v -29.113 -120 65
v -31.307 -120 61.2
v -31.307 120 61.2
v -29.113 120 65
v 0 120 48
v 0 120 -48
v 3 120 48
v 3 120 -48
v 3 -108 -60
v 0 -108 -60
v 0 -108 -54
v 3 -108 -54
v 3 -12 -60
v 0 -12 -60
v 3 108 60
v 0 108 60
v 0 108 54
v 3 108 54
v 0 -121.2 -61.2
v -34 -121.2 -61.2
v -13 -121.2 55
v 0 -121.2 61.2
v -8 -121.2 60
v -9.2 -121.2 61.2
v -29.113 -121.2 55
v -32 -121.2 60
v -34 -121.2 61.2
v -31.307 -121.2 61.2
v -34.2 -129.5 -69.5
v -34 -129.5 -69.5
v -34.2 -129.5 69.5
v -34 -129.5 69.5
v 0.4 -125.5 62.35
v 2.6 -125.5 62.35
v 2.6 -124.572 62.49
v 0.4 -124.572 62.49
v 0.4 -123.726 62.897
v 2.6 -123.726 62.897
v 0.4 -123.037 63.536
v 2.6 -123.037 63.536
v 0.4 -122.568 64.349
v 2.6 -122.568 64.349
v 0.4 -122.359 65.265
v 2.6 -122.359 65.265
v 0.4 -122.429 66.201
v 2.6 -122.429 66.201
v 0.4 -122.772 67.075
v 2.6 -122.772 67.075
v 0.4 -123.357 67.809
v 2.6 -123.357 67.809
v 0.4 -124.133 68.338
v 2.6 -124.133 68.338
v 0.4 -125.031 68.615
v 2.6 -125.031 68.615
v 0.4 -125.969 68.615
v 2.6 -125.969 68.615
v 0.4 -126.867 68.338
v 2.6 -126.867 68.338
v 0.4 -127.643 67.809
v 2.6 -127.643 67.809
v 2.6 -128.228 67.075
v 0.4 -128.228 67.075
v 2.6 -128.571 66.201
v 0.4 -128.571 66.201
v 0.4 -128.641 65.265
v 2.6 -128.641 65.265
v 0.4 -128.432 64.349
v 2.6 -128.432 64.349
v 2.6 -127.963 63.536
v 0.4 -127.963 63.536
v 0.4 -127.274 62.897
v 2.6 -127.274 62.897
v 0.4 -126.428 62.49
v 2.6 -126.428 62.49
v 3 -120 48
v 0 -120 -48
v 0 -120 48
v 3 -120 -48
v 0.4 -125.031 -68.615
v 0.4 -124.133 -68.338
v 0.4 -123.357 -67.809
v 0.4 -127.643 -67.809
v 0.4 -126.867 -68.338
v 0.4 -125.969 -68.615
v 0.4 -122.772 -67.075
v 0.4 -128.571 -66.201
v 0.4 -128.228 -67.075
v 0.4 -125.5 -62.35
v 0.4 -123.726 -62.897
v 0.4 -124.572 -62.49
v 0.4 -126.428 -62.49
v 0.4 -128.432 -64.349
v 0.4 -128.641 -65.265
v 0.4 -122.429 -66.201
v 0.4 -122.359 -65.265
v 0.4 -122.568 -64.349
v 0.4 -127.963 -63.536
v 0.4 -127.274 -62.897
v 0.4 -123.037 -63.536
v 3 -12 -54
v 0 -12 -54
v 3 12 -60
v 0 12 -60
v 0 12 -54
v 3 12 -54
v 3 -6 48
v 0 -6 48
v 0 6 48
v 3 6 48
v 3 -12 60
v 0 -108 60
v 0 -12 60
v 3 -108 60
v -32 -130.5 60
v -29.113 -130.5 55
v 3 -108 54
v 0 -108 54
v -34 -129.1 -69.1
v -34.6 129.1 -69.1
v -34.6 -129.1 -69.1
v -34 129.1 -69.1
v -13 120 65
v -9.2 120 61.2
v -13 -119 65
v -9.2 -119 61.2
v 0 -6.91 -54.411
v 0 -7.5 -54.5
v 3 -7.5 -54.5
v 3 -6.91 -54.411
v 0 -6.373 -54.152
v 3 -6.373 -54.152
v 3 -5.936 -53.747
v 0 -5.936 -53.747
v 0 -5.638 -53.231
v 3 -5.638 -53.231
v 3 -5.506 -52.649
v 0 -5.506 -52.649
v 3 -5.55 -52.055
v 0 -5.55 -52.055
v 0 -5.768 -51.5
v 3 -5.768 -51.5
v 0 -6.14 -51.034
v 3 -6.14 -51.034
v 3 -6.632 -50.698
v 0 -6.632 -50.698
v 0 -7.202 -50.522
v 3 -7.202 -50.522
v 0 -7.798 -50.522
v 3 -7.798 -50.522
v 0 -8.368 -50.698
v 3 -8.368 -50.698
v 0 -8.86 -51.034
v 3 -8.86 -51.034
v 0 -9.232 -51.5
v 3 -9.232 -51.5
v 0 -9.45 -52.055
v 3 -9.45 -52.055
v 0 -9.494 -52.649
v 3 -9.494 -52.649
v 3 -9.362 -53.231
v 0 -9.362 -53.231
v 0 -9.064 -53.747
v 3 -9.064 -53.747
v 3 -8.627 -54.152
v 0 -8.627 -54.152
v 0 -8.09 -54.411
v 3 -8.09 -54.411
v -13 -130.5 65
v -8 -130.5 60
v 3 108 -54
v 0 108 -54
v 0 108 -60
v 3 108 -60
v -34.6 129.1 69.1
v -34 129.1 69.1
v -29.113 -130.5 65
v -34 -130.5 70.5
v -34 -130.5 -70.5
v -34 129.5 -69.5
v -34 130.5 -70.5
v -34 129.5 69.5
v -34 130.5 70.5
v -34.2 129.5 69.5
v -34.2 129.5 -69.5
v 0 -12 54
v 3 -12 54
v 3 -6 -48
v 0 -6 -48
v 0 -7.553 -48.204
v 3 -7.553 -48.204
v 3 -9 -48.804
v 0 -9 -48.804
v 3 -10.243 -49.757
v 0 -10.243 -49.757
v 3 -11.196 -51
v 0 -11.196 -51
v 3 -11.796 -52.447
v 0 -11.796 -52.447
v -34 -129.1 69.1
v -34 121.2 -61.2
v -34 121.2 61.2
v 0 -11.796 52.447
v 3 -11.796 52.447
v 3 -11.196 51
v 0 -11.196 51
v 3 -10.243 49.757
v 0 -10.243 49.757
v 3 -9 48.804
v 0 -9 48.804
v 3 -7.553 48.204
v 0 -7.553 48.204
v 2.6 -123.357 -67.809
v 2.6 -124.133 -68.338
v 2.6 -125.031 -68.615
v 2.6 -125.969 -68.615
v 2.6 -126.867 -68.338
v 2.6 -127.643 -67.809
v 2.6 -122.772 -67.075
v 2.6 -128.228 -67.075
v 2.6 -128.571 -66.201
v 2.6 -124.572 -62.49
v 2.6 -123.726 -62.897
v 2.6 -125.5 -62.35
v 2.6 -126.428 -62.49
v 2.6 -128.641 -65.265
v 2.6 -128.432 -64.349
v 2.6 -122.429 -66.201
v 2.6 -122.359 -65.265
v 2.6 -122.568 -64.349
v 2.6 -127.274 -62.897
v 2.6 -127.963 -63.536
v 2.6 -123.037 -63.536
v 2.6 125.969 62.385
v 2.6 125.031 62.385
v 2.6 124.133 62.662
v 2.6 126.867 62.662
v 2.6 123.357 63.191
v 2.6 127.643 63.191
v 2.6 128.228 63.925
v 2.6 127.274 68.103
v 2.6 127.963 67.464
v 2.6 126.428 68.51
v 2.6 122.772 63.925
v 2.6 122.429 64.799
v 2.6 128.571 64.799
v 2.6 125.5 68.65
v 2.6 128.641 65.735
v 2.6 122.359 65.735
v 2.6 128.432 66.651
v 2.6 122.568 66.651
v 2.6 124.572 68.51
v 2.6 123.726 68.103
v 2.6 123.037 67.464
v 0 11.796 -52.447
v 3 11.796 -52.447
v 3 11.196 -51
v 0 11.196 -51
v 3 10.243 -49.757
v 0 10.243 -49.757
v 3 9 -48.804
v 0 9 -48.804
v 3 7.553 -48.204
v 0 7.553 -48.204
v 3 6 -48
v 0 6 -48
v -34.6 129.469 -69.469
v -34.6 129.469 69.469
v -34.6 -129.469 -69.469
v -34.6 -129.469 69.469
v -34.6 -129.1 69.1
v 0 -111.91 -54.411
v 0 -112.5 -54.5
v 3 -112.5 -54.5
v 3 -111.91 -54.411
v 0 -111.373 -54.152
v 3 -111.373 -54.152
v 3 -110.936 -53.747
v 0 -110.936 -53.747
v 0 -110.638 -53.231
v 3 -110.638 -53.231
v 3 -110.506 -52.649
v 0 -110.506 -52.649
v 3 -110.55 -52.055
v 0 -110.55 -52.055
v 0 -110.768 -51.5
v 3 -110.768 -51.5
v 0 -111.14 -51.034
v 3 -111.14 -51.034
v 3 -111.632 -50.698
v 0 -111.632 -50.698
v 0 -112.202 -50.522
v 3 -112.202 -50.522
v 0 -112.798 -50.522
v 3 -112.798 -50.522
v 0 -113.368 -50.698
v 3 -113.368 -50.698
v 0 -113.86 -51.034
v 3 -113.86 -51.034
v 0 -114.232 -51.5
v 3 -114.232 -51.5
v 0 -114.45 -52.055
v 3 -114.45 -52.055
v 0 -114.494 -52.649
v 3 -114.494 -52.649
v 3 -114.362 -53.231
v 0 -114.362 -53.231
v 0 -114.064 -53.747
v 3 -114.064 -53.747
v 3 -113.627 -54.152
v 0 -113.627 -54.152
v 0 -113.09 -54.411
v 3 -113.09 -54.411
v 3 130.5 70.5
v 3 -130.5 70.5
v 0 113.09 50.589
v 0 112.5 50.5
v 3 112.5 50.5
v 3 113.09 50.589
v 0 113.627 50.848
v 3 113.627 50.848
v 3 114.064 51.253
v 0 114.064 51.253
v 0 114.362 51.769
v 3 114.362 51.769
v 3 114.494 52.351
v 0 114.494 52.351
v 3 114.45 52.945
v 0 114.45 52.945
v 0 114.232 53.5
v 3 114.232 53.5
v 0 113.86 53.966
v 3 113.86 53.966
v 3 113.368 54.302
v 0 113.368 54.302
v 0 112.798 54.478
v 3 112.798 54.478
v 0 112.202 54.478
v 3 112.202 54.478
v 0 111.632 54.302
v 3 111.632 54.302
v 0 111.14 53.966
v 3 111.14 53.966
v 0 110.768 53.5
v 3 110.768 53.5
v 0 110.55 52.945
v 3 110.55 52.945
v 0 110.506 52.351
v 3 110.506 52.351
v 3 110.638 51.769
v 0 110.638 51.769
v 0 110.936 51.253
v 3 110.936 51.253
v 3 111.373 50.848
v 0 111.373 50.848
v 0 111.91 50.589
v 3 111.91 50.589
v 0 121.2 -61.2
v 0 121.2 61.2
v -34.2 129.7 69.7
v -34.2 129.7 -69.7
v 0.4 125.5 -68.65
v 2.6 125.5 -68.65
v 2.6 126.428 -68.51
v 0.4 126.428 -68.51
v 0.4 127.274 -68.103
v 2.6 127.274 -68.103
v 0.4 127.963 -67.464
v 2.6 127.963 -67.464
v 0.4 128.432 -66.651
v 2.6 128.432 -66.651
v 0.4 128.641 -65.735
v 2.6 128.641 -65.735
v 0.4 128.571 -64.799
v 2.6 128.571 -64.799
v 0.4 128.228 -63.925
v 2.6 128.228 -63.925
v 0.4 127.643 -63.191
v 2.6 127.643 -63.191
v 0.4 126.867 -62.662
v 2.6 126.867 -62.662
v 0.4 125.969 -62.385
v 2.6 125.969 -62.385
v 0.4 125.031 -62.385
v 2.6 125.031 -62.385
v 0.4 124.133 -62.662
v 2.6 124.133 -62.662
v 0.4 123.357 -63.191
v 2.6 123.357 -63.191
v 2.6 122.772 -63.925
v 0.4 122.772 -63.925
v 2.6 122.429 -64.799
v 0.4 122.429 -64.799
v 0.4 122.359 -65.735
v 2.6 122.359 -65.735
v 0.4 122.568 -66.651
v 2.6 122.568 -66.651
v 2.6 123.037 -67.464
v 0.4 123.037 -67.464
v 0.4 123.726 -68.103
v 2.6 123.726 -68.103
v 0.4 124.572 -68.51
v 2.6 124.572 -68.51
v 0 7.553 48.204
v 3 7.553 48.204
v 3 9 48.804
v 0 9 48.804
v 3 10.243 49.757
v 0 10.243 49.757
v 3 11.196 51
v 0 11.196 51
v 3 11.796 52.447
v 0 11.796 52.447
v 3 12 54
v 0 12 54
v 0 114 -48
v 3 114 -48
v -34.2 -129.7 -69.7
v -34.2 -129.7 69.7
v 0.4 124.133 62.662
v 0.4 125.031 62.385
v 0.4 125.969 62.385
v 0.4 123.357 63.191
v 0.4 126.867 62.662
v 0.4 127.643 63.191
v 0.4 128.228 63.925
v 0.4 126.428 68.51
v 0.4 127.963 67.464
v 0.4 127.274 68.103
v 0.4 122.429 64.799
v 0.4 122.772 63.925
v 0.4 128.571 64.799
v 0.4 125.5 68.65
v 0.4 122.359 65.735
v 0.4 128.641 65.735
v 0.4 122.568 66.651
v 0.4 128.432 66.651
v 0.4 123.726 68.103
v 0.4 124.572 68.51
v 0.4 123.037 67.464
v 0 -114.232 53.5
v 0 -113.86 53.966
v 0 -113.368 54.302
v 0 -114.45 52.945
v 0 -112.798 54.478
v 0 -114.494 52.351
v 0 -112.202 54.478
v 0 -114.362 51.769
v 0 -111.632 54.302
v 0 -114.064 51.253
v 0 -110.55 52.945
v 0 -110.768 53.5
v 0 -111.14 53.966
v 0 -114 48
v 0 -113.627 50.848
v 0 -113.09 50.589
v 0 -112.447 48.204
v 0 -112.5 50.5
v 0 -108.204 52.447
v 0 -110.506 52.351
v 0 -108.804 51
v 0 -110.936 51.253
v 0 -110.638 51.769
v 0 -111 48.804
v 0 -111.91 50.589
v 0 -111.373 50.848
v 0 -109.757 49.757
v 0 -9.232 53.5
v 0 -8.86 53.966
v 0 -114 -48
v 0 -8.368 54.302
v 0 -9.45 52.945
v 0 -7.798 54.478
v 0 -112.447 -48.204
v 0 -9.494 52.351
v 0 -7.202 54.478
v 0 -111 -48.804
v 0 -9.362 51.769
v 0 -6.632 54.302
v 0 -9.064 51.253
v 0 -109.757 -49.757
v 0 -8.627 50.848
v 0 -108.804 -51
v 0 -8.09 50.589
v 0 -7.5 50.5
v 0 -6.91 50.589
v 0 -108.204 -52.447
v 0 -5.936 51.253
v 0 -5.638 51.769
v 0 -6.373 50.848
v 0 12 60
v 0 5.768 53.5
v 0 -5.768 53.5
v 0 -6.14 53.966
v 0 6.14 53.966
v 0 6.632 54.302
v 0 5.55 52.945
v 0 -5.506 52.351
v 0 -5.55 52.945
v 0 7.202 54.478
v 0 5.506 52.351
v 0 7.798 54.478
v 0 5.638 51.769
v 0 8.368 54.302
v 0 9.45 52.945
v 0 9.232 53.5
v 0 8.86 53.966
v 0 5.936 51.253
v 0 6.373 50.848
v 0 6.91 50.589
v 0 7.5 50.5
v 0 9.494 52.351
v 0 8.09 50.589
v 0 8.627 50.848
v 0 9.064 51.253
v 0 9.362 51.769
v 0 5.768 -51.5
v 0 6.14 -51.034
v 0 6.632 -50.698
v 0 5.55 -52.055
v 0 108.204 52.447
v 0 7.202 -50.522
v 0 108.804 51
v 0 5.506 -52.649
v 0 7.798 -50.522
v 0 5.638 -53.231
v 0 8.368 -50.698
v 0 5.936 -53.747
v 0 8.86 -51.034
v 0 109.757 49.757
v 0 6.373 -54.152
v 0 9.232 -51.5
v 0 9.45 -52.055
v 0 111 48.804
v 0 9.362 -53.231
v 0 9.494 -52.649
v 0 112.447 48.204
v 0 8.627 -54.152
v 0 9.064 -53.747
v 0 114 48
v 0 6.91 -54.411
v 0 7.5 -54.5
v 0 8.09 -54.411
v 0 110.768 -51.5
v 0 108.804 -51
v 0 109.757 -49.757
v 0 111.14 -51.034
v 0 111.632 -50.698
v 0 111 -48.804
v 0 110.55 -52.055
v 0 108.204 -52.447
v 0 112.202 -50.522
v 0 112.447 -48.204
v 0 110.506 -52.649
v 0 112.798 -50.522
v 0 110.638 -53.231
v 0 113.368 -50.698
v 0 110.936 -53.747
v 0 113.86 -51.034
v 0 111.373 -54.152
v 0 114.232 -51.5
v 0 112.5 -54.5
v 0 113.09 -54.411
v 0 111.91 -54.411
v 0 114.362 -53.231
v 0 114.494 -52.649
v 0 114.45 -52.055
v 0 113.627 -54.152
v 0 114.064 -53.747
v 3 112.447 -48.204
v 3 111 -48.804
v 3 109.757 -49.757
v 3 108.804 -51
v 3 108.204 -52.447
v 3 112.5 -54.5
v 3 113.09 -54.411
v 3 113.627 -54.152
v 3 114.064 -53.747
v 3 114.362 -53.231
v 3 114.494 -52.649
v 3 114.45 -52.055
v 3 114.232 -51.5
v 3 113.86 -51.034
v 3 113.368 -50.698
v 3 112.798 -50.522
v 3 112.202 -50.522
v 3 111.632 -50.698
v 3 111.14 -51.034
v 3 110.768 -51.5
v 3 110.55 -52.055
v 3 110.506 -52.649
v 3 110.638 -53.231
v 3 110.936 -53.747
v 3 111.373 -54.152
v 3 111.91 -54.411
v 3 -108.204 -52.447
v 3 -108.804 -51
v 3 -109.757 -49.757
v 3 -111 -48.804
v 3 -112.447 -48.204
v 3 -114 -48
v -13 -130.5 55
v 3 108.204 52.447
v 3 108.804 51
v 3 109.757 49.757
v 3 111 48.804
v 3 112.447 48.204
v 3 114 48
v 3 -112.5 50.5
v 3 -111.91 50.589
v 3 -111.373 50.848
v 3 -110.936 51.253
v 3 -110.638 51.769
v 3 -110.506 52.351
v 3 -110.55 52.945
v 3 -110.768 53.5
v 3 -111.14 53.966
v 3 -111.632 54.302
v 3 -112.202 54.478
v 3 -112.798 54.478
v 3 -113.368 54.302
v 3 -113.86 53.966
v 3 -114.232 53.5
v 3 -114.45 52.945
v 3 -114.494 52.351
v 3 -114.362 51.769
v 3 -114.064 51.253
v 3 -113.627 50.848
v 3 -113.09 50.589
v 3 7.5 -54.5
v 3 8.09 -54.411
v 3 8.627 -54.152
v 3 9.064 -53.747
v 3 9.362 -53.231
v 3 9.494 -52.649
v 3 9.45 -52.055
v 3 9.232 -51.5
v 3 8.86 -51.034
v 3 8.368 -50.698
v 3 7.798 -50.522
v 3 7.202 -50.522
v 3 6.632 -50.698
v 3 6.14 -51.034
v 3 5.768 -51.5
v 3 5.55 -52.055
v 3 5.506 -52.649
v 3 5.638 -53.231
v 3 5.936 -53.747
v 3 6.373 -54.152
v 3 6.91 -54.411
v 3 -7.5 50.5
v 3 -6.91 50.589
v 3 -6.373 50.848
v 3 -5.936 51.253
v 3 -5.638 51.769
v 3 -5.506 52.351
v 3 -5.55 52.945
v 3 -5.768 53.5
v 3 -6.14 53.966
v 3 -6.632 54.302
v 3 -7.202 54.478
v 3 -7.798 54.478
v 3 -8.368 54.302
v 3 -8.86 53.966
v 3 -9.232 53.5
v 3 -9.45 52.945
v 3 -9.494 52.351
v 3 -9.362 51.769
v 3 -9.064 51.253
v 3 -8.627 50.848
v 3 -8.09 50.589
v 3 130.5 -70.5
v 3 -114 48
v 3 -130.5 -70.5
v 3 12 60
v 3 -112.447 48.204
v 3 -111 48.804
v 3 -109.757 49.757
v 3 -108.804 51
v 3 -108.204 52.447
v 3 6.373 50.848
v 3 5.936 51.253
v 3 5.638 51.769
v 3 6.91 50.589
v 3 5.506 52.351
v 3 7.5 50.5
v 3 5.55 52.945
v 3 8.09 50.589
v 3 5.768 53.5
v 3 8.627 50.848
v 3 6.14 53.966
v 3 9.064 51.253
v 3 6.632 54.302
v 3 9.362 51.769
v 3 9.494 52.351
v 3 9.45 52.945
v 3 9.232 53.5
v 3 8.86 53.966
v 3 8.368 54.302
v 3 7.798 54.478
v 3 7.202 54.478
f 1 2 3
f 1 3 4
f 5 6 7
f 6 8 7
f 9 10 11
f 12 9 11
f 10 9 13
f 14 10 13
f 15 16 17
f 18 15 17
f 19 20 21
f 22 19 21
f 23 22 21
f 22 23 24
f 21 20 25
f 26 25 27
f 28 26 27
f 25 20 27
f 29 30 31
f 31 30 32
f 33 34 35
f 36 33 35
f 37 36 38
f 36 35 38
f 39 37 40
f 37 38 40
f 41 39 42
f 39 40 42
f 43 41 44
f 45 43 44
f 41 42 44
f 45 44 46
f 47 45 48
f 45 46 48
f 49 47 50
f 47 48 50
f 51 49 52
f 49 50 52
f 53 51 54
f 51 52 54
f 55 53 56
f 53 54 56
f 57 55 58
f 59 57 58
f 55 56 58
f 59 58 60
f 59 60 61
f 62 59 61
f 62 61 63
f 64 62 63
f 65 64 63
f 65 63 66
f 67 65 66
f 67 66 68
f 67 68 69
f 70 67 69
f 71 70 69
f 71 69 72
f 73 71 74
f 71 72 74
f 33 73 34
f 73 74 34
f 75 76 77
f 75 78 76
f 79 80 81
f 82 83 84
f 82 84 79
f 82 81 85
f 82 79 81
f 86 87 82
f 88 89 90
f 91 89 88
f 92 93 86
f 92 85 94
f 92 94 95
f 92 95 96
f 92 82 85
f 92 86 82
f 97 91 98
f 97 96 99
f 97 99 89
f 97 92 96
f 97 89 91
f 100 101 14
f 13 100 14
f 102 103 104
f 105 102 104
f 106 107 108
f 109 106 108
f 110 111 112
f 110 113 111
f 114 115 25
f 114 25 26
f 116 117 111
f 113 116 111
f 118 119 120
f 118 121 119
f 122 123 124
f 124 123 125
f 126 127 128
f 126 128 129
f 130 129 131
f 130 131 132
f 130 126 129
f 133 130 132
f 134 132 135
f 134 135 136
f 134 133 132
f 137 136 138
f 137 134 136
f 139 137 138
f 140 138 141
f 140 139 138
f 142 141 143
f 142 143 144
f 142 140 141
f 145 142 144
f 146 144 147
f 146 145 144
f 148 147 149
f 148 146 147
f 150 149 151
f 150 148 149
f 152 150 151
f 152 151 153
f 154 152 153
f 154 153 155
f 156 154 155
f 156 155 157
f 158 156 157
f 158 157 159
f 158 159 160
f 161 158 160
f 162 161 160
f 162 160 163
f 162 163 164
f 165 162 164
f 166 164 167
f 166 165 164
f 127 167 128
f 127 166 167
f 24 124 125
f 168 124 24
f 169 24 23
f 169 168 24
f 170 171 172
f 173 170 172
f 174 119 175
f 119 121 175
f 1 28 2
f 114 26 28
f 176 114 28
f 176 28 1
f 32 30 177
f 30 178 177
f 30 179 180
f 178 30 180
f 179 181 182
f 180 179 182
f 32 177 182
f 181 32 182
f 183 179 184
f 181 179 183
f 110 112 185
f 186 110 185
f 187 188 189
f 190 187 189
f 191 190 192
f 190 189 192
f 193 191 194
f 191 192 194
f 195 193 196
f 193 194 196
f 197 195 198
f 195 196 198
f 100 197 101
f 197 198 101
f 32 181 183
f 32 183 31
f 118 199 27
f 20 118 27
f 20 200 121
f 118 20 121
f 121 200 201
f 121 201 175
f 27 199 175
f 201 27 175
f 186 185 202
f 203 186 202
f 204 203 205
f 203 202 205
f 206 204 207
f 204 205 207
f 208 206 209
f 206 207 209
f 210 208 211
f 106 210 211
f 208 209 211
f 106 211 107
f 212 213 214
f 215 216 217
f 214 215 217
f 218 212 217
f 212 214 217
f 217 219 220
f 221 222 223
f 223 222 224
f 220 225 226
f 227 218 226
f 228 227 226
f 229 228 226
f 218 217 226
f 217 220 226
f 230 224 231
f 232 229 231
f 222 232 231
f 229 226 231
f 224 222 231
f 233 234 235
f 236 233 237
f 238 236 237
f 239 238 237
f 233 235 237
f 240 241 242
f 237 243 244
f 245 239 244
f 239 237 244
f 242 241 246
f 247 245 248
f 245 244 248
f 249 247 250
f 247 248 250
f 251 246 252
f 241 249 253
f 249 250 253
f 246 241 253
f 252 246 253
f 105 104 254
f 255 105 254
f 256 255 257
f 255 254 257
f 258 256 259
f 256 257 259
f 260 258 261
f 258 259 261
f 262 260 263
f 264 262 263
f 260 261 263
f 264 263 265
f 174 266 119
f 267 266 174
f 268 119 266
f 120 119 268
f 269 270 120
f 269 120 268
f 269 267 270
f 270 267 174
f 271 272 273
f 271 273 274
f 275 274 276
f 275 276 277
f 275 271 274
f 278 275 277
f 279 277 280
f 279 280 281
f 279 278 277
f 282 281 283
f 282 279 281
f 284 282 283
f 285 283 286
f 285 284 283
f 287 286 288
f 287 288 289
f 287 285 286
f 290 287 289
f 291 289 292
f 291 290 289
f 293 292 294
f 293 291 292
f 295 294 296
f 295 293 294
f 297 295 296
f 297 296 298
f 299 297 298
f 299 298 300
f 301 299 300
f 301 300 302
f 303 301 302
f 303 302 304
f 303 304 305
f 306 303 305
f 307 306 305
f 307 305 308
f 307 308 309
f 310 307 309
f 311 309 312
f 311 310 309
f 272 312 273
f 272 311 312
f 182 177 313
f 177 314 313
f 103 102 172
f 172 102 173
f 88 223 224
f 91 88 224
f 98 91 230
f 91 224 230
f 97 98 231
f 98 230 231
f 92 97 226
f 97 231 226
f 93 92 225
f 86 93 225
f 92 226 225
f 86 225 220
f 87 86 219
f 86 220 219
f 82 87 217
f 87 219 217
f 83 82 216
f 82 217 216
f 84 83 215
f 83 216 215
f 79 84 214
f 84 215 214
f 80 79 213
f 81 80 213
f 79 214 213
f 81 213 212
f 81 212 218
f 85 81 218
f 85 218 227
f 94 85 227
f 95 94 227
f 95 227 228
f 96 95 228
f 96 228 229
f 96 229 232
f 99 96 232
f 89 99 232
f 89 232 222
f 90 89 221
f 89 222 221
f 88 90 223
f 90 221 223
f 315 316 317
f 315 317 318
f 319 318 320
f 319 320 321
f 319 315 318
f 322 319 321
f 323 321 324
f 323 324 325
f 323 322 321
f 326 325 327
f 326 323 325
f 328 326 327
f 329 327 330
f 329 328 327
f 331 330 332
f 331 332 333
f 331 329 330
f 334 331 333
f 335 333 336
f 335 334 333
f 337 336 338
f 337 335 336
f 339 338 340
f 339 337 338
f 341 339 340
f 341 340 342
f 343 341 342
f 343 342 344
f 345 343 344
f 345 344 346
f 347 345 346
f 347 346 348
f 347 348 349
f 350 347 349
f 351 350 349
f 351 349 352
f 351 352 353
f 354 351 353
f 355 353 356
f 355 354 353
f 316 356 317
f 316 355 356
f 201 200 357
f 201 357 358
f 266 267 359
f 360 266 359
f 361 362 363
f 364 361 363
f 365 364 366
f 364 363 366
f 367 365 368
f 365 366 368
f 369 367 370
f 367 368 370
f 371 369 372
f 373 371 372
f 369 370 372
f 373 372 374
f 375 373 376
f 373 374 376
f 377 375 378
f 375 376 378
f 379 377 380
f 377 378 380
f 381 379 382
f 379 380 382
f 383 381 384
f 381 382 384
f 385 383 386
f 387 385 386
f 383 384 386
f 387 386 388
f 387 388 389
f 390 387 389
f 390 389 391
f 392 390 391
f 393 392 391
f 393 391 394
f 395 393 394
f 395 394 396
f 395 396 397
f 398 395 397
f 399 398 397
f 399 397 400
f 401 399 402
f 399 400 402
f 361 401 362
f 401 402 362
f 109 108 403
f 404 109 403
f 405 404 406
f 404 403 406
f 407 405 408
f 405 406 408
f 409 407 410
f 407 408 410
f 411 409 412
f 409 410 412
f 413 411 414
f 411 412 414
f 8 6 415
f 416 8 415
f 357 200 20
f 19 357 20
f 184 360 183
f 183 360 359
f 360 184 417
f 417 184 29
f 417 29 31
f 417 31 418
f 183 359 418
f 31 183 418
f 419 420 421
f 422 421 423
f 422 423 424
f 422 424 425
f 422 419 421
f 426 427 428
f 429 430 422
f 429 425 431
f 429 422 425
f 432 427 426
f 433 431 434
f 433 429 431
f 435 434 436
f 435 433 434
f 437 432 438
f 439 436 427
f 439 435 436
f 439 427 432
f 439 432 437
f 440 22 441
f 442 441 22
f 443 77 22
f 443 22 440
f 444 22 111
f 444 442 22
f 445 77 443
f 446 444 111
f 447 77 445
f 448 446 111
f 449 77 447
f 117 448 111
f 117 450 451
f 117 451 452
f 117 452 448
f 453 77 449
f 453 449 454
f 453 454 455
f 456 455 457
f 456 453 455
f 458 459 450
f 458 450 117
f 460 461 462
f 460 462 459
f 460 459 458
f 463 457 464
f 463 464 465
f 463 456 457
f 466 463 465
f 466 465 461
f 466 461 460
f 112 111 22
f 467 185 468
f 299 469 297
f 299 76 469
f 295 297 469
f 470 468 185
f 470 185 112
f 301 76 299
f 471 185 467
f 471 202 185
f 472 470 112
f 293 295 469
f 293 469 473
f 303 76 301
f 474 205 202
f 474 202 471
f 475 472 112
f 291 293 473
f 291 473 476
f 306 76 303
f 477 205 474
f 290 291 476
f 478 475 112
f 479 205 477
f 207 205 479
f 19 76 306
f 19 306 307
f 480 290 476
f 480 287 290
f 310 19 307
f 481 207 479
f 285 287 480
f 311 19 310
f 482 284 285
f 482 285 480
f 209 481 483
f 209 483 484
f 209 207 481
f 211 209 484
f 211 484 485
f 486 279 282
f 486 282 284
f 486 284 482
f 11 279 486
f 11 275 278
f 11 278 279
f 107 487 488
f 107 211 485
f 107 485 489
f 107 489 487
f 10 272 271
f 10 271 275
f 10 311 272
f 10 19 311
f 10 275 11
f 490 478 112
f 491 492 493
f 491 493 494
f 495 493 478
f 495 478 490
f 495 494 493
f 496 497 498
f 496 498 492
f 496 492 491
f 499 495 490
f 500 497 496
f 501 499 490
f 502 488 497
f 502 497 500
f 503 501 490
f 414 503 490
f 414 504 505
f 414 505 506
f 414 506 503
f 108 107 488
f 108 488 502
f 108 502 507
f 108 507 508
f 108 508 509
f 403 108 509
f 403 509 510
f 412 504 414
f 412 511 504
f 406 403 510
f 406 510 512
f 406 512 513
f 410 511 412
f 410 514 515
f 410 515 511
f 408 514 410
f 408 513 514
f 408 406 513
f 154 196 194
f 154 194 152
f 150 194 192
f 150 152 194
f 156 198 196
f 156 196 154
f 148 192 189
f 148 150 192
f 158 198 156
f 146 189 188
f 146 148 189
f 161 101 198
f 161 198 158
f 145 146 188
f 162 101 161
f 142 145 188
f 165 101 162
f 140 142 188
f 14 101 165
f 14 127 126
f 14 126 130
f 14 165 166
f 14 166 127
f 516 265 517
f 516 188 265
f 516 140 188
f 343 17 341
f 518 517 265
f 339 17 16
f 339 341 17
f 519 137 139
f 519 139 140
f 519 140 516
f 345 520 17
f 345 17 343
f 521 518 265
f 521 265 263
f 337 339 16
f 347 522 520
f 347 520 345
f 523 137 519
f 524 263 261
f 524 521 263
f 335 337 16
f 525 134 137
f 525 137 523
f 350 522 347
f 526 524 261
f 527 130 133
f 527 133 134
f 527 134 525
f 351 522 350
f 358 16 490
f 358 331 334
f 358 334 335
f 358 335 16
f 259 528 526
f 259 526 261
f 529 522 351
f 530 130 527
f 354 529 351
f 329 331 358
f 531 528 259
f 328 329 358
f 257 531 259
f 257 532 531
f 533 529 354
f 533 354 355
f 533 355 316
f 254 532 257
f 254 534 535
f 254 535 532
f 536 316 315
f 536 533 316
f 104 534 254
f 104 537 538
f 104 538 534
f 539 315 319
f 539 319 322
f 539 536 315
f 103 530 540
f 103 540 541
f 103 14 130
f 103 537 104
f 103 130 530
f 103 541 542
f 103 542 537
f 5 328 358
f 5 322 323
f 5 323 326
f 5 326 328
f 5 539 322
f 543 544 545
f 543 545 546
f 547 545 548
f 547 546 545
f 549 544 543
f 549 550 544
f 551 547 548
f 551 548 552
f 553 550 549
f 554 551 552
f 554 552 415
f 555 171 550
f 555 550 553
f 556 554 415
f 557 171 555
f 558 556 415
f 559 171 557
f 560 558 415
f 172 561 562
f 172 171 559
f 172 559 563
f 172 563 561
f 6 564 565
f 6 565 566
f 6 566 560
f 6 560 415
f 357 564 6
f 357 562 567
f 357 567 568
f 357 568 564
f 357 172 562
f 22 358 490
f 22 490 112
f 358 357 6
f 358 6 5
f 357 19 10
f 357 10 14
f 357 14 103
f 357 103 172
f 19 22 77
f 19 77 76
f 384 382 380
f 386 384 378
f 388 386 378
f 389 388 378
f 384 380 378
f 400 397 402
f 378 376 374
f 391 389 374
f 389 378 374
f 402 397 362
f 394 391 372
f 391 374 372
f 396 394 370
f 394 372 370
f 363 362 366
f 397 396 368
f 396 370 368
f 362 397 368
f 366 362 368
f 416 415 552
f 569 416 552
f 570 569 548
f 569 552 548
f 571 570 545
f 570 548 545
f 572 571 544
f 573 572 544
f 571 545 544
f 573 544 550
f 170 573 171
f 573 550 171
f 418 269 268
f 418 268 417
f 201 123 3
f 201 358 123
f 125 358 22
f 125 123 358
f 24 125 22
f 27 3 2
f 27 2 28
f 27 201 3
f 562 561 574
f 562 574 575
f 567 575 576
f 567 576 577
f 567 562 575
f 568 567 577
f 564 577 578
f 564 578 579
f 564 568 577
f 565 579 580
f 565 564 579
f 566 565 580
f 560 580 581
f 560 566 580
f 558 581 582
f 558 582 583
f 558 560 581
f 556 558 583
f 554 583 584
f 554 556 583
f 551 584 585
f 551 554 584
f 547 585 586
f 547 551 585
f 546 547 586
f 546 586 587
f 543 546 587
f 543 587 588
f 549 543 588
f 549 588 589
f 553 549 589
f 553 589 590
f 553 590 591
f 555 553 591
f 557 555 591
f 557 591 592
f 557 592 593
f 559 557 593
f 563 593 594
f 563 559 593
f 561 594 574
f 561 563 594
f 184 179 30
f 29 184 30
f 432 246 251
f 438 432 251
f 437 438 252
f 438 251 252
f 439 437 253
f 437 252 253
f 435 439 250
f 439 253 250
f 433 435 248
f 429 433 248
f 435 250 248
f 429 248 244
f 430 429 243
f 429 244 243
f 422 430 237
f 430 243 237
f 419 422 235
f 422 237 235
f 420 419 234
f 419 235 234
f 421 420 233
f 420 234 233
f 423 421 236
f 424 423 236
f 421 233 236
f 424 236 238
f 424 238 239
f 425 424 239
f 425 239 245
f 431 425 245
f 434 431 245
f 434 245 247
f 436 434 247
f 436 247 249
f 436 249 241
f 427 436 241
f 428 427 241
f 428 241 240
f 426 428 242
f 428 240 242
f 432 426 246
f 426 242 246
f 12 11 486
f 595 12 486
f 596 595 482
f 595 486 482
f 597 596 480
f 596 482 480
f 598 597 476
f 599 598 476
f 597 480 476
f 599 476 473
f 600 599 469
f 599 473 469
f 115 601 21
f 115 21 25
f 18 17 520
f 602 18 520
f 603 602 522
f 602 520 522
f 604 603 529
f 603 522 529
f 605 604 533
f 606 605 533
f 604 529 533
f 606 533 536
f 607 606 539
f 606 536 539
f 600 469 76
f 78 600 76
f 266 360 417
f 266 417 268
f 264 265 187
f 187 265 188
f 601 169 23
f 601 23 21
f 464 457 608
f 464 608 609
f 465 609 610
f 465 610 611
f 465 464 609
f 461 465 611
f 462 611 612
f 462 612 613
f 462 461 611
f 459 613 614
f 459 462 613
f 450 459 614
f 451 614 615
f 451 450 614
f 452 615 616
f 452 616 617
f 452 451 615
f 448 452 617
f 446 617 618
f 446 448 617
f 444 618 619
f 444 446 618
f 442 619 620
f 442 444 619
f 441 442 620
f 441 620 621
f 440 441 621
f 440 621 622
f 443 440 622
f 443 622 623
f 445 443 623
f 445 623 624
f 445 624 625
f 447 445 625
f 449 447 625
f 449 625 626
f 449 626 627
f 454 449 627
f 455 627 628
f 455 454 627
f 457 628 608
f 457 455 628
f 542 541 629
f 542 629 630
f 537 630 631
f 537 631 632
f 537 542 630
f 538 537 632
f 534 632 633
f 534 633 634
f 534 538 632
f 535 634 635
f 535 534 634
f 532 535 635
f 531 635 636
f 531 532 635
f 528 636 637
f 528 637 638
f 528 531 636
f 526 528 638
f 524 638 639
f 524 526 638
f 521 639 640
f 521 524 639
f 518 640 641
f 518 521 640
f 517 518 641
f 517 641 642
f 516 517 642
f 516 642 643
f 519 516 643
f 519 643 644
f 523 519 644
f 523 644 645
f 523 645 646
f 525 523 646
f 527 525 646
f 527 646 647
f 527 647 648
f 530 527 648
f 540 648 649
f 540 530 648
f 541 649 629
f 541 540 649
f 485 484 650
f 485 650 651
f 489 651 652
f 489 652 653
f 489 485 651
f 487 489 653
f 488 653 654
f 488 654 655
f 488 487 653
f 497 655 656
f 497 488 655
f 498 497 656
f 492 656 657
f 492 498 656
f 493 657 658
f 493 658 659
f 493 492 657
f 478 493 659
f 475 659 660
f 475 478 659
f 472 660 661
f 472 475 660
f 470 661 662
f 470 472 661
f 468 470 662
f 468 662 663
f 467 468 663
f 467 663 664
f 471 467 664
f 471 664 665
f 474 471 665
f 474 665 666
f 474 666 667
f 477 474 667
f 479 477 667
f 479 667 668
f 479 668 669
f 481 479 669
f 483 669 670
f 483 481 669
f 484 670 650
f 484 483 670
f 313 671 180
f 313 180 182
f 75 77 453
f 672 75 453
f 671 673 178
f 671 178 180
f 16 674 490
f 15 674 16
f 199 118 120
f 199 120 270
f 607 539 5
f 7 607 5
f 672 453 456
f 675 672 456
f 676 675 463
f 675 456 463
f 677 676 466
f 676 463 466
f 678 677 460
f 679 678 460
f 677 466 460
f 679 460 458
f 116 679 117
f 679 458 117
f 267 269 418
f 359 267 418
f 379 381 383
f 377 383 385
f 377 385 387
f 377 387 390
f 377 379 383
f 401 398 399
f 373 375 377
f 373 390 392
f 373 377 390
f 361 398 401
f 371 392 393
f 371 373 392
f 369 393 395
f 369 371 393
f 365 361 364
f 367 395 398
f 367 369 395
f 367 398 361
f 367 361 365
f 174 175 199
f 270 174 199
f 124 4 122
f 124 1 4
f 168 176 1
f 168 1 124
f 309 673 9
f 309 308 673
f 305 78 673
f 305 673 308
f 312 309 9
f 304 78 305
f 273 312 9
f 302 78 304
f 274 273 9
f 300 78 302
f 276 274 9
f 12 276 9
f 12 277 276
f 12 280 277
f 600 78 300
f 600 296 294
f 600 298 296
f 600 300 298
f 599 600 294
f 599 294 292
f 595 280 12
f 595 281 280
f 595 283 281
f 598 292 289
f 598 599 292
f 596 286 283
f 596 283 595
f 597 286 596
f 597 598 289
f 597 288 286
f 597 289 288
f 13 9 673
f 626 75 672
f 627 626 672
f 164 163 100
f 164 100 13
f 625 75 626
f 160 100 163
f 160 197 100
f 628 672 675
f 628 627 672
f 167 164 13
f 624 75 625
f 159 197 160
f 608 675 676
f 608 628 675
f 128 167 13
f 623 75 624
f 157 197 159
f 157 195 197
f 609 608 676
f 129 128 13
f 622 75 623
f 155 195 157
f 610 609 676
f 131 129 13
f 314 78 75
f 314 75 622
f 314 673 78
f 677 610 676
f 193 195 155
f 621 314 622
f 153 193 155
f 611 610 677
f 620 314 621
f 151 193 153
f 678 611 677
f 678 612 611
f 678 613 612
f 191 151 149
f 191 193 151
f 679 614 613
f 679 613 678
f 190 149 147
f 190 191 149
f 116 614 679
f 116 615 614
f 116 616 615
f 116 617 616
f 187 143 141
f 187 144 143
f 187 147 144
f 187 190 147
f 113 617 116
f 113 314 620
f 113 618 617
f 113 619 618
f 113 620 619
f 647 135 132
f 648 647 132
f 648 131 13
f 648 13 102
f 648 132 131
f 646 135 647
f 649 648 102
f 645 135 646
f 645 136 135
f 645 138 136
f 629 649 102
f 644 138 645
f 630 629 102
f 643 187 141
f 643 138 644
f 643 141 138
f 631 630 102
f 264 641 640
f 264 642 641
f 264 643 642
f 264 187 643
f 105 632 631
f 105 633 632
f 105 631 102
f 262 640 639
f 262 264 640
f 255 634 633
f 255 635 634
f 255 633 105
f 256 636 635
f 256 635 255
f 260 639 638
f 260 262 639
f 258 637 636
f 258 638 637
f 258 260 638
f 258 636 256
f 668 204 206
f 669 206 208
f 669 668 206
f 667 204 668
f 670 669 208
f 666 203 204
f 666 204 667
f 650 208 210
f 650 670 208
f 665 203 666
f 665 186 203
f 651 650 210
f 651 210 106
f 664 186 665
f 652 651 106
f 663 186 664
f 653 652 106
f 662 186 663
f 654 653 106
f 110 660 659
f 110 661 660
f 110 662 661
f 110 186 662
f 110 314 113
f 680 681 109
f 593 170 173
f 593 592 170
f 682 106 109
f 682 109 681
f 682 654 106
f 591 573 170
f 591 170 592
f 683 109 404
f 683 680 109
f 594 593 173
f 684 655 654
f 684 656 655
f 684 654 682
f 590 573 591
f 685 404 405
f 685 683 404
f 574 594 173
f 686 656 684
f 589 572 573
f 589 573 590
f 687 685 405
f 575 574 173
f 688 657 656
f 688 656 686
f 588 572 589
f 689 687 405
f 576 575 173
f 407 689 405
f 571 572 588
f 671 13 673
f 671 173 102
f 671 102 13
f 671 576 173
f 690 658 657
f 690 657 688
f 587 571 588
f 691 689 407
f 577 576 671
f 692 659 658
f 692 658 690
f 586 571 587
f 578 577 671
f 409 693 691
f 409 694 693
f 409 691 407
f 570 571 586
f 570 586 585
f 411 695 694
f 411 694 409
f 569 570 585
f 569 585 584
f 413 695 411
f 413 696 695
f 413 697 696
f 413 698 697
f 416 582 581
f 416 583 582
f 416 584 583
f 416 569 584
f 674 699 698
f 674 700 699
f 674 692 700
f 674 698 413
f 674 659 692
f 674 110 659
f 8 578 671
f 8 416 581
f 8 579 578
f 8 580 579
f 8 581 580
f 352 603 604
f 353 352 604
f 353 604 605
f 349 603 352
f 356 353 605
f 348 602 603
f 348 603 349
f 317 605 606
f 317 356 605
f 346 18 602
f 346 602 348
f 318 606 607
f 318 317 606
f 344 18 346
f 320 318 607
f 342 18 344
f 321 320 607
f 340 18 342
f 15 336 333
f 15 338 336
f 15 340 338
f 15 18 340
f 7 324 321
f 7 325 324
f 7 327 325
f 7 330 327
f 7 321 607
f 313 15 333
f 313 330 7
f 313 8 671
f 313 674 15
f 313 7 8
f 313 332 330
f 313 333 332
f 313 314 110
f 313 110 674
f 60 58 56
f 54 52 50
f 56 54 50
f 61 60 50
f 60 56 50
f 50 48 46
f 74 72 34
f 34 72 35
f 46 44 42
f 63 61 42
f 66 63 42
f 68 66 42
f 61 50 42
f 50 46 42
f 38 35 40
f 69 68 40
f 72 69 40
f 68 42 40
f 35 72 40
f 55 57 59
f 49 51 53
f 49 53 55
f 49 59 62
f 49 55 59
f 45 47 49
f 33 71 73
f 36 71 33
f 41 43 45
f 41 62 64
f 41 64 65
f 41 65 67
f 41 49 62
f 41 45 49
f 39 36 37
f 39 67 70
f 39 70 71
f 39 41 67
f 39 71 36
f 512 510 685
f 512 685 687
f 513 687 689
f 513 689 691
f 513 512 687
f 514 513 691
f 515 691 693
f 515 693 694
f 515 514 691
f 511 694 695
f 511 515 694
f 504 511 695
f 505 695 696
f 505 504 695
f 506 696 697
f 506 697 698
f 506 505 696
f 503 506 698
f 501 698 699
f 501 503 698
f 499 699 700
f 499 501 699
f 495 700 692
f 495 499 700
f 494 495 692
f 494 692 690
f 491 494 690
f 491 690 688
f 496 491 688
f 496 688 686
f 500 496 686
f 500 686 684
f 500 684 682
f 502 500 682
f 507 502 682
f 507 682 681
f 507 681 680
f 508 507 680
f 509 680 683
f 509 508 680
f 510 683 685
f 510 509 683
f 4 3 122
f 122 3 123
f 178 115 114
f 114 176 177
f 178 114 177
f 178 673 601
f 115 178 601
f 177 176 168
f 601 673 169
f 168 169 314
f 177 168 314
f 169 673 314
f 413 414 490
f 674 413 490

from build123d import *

# Parameters (mm, degrees)
SKETCH1_W                = 261
SKETCH1_H                = 141
SKETCH1_W_2              = 240
SKETCH1_H_2              = 120
SKETCH1_R                = 2
BOSS_EXTRUDE2_DEPTH      = 3
SKETCH1_6_W              = 261
SKETCH1_6_H              = 141
SKETCH1_6_W_2            = 240
SKETCH1_6_H_2            = 120
BOSS_EXTRUDE5_DEPTH      = 34
SKETCH14_W               = 259
SKETCH14_H               = 139
SKETCH14_W_2             = 258.2
SKETCH14_H_2             = 138.2
BOSS_EXTRUDE7_DEPTH      = 0.2
SKETCH17_W               = 259.4
SKETCH17_H               = 139.4
SKETCH17_W_2             = 258.2
SKETCH17_H_2             = 138.2
BOSS_EXTRUDE10_DEPTH     = 0.4
CHAMFER1_SIZE            = 0.4
CHAMFER1_SIZE_2          = 0.230940108
COVER_START              = -0.4
SKETCH18_R               = 3.15
COVER_MAGNET_HOLES_DEPTH = 2.2
SKETCH19_W               = 16
SKETCH19_H               = 240
CUT_EXTRUDE1_DEPTH       = 5
CHAMFER2_SIZE            = 3
CHAMFER2_SIZE_2          = 5.196152423
CHAMFER3_SIZE            = 5
CUT_EXTRUDE2_START       = -10.5
CUT_EXTRUDE2_DEPTH       = 11.5
CUT_EXTRUDE3_REACH       = 154.871
SKETCH21_W               = 242.4
SKETCH21_H               = 122.4


with BuildPart() as part:
    # Sketch1 → Boss-Extrude2 (new body)
    # profile 1 of 9: a face of its own
    with BuildSketch(Plane.YZ):
        Rectangle(SKETCH1_W, SKETCH1_H)
        Rectangle(SKETCH1_W_2, SKETCH1_H_2, mode=Mode.SUBTRACT)
    # profile 2 of 9: a face of its own
    with BuildSketch(Plane.YZ):
        with BuildLine():
            Line((-120, 60), (-120, 48))
            Line((-120, 48), (-114, 48))
            ThreePointArc((-114, 48), (-109.757359313, 49.757359313), (-108, 54))
            Line((-108, 54), (-108, 60))
            Line((-108, 60), (-120, 60))
        make_face()
        with Locations(Location((-112.5, 52.5, 0), (0, 0, 270))):
            Circle(SKETCH1_R, mode=Mode.SUBTRACT)
    # profile 3 of 9: a face of its own
    with BuildSketch(Plane.YZ):
        with BuildLine():
            Line((0, 60), (-12, 60))
            Line((-12, 60), (-12, 54))
            ThreePointArc((-12, 54), (-10.242640687, 49.757359313), (-6, 48))
            Line((-6, 48), (0, 48))
            Line((0, 48), (0, 60))
        make_face()
        with Locations(Location((-7.5, 52.5, 0), (0, 0, 270))):
            Circle(SKETCH1_R, mode=Mode.SUBTRACT)
    # profile 4 of 9: a face of its own
    with BuildSketch(Plane.YZ):
        with BuildLine():
            Line((12, 60), (0, 60))
            Line((0, 60), (0, 48))
            Line((0, 48), (6, 48))
            ThreePointArc((6, 48), (10.242640687, 49.757359313), (12, 54))
            Line((12, 54), (12, 60))
        make_face()
        with Locations(Location((7.5, 52.5, 0), (0, 0, 270))):
            Circle(SKETCH1_R, mode=Mode.SUBTRACT)
    # profile 5 of 9: a face of its own
    with BuildSketch(Plane.YZ):
        with BuildLine():
            Line((114, 48), (120, 48))
            Line((120, 48), (120, 60))
            Line((120, 60), (108, 60))
            Line((108, 60), (108, 54))
            ThreePointArc((108, 54), (109.757359313, 49.757359313), (114, 48))
        make_face()
        with Locations(Location((112.5, 52.5, 0), (0, 0, 270))):
            Circle(SKETCH1_R, mode=Mode.SUBTRACT)
    # profile 6 of 9: a face of its own
    with BuildSketch(Plane.YZ):
        with BuildLine():
            Line((108, -54), (108, -60))
            Line((108, -60), (120, -60))
            Line((120, -60), (120, -48))
            Line((120, -48), (114, -48))
            ThreePointArc((114, -48), (109.757359313, -49.757359313), (108, -54))
        make_face()
        with Locations(Location((112.5, -52.5, 0), (0, 0, 270))):
            Circle(SKETCH1_R, mode=Mode.SUBTRACT)
    # profile 7 of 9: a face of its own
    with BuildSketch(Plane.YZ):
        with BuildLine():
            Line((0, -48), (0, -60))
            Line((0, -60), (12, -60))
            Line((12, -60), (12, -54))
            ThreePointArc((12, -54), (10.242640687, -49.757359313), (6, -48))
            Line((6, -48), (0, -48))
        make_face()
        with Locations(Location((7.5, -52.5, 0), (0, 0, 270))):
            Circle(SKETCH1_R, mode=Mode.SUBTRACT)
    # profile 8 of 9: a face of its own
    with BuildSketch(Plane.YZ):
        with BuildLine():
            Line((-12, -54), (-12, -60))
            Line((-12, -60), (0, -60))
            Line((0, -60), (0, -48))
            Line((0, -48), (-6, -48))
            ThreePointArc((-6, -48), (-10.242640687, -49.757359313), (-12, -54))
        make_face()
        with Locations(Location((-7.5, -52.5, 0), (0, 0, 270))):
            Circle(SKETCH1_R, mode=Mode.SUBTRACT)
    # profile 9 of 9: a face of its own
    with BuildSketch(Plane.YZ):
        with BuildLine():
            Line((-120, -48), (-120, -60))
            Line((-120, -60), (-108, -60))
            Line((-108, -60), (-108, -54))
            ThreePointArc((-108, -54), (-109.757359313, -49.757359313), (-114, -48))
            Line((-114, -48), (-120, -48))
        make_face()
        with Locations(Location((-112.5, -52.5, 0), (0, 0, 270))):
            Circle(SKETCH1_R, mode=Mode.SUBTRACT)
    extrude(amount=BOSS_EXTRUDE2_DEPTH)

    # Sketch1<6> → Boss-Extrude5 (add)
    with BuildSketch(Plane.YZ):
        Rectangle(SKETCH1_6_W, SKETCH1_6_H)
        Rectangle(SKETCH1_6_W_2, SKETCH1_6_H_2, mode=Mode.SUBTRACT)
    extrude(amount=-BOSS_EXTRUDE5_DEPTH)

    # Sketch14 → Boss-Extrude7 (add)
    with BuildSketch(Plane(origin=(-34, 0, 0), x_dir=(0, -1, 0), z_dir=(-1, 0, 0))):
        Rectangle(SKETCH14_W, SKETCH14_H)
        Rectangle(SKETCH14_W_2, SKETCH14_H_2, mode=Mode.SUBTRACT)
    extrude(amount=BOSS_EXTRUDE7_DEPTH)

    # Sketch17 → Boss-Extrude10 (add)
    with BuildSketch(Plane(origin=(-34.2, 0, 0), x_dir=(0, -1, 0), z_dir=(-1, 0, 0))):
        Rectangle(SKETCH17_W, SKETCH17_H)
        Rectangle(SKETCH17_W_2, SKETCH17_H_2, mode=Mode.SUBTRACT)
    extrude(amount=BOSS_EXTRUDE10_DEPTH)

    # Chamfer1
    # the kernel refuses this chamfer: 0.4, 0.230940108 mm, written as the material it takes off along each edge
    with BuildSketch(Plane(origin=(-34.6, 130.734834302, -69.7), x_dir=(1, 0, 0), z_dir=(0, -1, 0))) as chamfer1_piece_1:
        Polygon((CHAMFER1_SIZE, 0), (0, CHAMFER1_SIZE_2 * 0.999999998596), (0, 0), align=None)
    extrude(amount=261.469668604, mode=Mode.SUBTRACT)
    with BuildSketch(Plane(origin=(-34.6, -129.7, -70.734834302), x_dir=(0, 1, 0), z_dir=(0, 0, 1)), Plane(origin=(-34.6, 129.7, 70.734834302), x_dir=(0, -1, 0), z_dir=(0, 0, -1))) as chamfer1_piece_2:
        Polygon((CHAMFER1_SIZE_2 * 0.999999998596, 0), (0, -CHAMFER1_SIZE), (0, 0), align=None)
    extrude(amount=141.469668604, mode=Mode.SUBTRACT)
    with BuildSketch(Plane(origin=(-34.6, -130.734834302, 69.7), x_dir=(0, 0, -1), z_dir=(0, 1, 0))) as chamfer1_piece_3:
        Polygon((CHAMFER1_SIZE_2 * 0.999999998596, 0), (0, -CHAMFER1_SIZE), (0, 0), align=None)
    extrude(amount=261.469668604, mode=Mode.SUBTRACT)

    # Sketch18 → Cover magnet holes (cut)
    with BuildSketch(Plane.YZ.offset(3).offset(COVER_START)):
        with Locations(Location((-125.5, 65.5, 0), (0, 0, 270))):
            Circle(SKETCH18_R)
        with Locations(Location((125.5, 65.5, 0), (0, 0, 90))):
            Circle(SKETCH18_R)
        with Locations(Location((125.5, -65.5, 0), (0, 0, 270))):
            Circle(SKETCH18_R)
        with Locations(Location((-125.5, -65.5, 0), (0, 0, 90))):
            Circle(SKETCH18_R)
    extrude(amount=-COVER_MAGNET_HOLES_DEPTH, mode=Mode.SUBTRACT)

    # Sketch19 → Cut-Extrude1 (cut)
    with BuildSketch(Plane(origin=(0, 0, 60), x_dir=(1, 0, 0), z_dir=(0, 0, -1))):
        with Locations((-21, 0)):
            Rectangle(SKETCH19_W, SKETCH19_H)
    extrude(amount=-CUT_EXTRUDE1_DEPTH, mode=Mode.SUBTRACT)

    # Chamfer2
    # the kernel refuses this chamfer: 5.196152423, 3 mm, written as the material it takes off along each edge
    with BuildSketch(Plane(origin=(-29, 120, 60), x_dir=(-1, 0, 0), z_dir=(0, -1, 0))) as chamfer2_piece_1_section:
        Polygon((CHAMFER2_SIZE, 0), (0, -CHAMFER2_SIZE_2), (0, 0), align=None)
    chamfer2_piece_1 = extrude(amount=240, mode=Mode.PRIVATE)
    chamfer2_piece_1 = split(chamfer2_piece_1, bisect_by=Plane(origin=(-29, 120, 65), z_dir=(0, 0, -1)), keep=Keep.TOP, mode=Mode.PRIVATE)
    add(chamfer2_piece_1, mode=Mode.SUBTRACT)

    # Chamfer3
    chamfer3_edges = [part.edges().sort_by_distance(p)[0] for p in [
        (-13, 0, 60),
    ]]
    chamfer(chamfer3_edges, length=CHAMFER3_SIZE - 0.0001)  # a hair under: the kernel refuses the full size

    # Cut-Extrude2: read off the stored shape, not the designer's step
    # Cut-Extrude2 outline → Cut-Extrude2 (cut)
    with BuildSketch(Plane(origin=(0, -120, 0), x_dir=(-1, 0, 0), z_dir=(0, 1, 0)).offset(CUT_EXTRUDE2_START)):
        Polygon((13, 65), (8, 60), (13, 55), (29.113248654, 55), (32, 60), (29.113248654, 65), align=None)
    extrude(amount=CUT_EXTRUDE2_DEPTH, mode=Mode.SUBTRACT)

    # Cut-Extrude3: up to this face of the body (flat: up to its plane)
    cut_extrude3_end = Plane(part.part.faces().sort_by_distance((0, 114.443379347, 54.443379347))[0])
    # Sketch21 → Cut-Extrude3 (cut, up to the picked face)
    with BuildSketch(Plane(origin=(-34, 0, 0), x_dir=(0, -1, 0), z_dir=(-1, 0, 0)), mode=Mode.PRIVATE) as cut_extrude3_sk1:
        Rectangle(SKETCH21_W, SKETCH21_H)
    cut_extrude3_tool1 = split(extrude(cut_extrude3_sk1.sketch, amount=-CUT_EXTRUDE3_REACH, mode=Mode.PRIVATE), bisect_by=cut_extrude3_end, keep=Keep.BOTH, mode=Mode.PRIVATE)
    add(cut_extrude3_tool1.solids().sort_by(Axis((-34, 0, 0), (1, 0, 0)))[0], mode=Mode.SUBTRACT)


solid = part.part
